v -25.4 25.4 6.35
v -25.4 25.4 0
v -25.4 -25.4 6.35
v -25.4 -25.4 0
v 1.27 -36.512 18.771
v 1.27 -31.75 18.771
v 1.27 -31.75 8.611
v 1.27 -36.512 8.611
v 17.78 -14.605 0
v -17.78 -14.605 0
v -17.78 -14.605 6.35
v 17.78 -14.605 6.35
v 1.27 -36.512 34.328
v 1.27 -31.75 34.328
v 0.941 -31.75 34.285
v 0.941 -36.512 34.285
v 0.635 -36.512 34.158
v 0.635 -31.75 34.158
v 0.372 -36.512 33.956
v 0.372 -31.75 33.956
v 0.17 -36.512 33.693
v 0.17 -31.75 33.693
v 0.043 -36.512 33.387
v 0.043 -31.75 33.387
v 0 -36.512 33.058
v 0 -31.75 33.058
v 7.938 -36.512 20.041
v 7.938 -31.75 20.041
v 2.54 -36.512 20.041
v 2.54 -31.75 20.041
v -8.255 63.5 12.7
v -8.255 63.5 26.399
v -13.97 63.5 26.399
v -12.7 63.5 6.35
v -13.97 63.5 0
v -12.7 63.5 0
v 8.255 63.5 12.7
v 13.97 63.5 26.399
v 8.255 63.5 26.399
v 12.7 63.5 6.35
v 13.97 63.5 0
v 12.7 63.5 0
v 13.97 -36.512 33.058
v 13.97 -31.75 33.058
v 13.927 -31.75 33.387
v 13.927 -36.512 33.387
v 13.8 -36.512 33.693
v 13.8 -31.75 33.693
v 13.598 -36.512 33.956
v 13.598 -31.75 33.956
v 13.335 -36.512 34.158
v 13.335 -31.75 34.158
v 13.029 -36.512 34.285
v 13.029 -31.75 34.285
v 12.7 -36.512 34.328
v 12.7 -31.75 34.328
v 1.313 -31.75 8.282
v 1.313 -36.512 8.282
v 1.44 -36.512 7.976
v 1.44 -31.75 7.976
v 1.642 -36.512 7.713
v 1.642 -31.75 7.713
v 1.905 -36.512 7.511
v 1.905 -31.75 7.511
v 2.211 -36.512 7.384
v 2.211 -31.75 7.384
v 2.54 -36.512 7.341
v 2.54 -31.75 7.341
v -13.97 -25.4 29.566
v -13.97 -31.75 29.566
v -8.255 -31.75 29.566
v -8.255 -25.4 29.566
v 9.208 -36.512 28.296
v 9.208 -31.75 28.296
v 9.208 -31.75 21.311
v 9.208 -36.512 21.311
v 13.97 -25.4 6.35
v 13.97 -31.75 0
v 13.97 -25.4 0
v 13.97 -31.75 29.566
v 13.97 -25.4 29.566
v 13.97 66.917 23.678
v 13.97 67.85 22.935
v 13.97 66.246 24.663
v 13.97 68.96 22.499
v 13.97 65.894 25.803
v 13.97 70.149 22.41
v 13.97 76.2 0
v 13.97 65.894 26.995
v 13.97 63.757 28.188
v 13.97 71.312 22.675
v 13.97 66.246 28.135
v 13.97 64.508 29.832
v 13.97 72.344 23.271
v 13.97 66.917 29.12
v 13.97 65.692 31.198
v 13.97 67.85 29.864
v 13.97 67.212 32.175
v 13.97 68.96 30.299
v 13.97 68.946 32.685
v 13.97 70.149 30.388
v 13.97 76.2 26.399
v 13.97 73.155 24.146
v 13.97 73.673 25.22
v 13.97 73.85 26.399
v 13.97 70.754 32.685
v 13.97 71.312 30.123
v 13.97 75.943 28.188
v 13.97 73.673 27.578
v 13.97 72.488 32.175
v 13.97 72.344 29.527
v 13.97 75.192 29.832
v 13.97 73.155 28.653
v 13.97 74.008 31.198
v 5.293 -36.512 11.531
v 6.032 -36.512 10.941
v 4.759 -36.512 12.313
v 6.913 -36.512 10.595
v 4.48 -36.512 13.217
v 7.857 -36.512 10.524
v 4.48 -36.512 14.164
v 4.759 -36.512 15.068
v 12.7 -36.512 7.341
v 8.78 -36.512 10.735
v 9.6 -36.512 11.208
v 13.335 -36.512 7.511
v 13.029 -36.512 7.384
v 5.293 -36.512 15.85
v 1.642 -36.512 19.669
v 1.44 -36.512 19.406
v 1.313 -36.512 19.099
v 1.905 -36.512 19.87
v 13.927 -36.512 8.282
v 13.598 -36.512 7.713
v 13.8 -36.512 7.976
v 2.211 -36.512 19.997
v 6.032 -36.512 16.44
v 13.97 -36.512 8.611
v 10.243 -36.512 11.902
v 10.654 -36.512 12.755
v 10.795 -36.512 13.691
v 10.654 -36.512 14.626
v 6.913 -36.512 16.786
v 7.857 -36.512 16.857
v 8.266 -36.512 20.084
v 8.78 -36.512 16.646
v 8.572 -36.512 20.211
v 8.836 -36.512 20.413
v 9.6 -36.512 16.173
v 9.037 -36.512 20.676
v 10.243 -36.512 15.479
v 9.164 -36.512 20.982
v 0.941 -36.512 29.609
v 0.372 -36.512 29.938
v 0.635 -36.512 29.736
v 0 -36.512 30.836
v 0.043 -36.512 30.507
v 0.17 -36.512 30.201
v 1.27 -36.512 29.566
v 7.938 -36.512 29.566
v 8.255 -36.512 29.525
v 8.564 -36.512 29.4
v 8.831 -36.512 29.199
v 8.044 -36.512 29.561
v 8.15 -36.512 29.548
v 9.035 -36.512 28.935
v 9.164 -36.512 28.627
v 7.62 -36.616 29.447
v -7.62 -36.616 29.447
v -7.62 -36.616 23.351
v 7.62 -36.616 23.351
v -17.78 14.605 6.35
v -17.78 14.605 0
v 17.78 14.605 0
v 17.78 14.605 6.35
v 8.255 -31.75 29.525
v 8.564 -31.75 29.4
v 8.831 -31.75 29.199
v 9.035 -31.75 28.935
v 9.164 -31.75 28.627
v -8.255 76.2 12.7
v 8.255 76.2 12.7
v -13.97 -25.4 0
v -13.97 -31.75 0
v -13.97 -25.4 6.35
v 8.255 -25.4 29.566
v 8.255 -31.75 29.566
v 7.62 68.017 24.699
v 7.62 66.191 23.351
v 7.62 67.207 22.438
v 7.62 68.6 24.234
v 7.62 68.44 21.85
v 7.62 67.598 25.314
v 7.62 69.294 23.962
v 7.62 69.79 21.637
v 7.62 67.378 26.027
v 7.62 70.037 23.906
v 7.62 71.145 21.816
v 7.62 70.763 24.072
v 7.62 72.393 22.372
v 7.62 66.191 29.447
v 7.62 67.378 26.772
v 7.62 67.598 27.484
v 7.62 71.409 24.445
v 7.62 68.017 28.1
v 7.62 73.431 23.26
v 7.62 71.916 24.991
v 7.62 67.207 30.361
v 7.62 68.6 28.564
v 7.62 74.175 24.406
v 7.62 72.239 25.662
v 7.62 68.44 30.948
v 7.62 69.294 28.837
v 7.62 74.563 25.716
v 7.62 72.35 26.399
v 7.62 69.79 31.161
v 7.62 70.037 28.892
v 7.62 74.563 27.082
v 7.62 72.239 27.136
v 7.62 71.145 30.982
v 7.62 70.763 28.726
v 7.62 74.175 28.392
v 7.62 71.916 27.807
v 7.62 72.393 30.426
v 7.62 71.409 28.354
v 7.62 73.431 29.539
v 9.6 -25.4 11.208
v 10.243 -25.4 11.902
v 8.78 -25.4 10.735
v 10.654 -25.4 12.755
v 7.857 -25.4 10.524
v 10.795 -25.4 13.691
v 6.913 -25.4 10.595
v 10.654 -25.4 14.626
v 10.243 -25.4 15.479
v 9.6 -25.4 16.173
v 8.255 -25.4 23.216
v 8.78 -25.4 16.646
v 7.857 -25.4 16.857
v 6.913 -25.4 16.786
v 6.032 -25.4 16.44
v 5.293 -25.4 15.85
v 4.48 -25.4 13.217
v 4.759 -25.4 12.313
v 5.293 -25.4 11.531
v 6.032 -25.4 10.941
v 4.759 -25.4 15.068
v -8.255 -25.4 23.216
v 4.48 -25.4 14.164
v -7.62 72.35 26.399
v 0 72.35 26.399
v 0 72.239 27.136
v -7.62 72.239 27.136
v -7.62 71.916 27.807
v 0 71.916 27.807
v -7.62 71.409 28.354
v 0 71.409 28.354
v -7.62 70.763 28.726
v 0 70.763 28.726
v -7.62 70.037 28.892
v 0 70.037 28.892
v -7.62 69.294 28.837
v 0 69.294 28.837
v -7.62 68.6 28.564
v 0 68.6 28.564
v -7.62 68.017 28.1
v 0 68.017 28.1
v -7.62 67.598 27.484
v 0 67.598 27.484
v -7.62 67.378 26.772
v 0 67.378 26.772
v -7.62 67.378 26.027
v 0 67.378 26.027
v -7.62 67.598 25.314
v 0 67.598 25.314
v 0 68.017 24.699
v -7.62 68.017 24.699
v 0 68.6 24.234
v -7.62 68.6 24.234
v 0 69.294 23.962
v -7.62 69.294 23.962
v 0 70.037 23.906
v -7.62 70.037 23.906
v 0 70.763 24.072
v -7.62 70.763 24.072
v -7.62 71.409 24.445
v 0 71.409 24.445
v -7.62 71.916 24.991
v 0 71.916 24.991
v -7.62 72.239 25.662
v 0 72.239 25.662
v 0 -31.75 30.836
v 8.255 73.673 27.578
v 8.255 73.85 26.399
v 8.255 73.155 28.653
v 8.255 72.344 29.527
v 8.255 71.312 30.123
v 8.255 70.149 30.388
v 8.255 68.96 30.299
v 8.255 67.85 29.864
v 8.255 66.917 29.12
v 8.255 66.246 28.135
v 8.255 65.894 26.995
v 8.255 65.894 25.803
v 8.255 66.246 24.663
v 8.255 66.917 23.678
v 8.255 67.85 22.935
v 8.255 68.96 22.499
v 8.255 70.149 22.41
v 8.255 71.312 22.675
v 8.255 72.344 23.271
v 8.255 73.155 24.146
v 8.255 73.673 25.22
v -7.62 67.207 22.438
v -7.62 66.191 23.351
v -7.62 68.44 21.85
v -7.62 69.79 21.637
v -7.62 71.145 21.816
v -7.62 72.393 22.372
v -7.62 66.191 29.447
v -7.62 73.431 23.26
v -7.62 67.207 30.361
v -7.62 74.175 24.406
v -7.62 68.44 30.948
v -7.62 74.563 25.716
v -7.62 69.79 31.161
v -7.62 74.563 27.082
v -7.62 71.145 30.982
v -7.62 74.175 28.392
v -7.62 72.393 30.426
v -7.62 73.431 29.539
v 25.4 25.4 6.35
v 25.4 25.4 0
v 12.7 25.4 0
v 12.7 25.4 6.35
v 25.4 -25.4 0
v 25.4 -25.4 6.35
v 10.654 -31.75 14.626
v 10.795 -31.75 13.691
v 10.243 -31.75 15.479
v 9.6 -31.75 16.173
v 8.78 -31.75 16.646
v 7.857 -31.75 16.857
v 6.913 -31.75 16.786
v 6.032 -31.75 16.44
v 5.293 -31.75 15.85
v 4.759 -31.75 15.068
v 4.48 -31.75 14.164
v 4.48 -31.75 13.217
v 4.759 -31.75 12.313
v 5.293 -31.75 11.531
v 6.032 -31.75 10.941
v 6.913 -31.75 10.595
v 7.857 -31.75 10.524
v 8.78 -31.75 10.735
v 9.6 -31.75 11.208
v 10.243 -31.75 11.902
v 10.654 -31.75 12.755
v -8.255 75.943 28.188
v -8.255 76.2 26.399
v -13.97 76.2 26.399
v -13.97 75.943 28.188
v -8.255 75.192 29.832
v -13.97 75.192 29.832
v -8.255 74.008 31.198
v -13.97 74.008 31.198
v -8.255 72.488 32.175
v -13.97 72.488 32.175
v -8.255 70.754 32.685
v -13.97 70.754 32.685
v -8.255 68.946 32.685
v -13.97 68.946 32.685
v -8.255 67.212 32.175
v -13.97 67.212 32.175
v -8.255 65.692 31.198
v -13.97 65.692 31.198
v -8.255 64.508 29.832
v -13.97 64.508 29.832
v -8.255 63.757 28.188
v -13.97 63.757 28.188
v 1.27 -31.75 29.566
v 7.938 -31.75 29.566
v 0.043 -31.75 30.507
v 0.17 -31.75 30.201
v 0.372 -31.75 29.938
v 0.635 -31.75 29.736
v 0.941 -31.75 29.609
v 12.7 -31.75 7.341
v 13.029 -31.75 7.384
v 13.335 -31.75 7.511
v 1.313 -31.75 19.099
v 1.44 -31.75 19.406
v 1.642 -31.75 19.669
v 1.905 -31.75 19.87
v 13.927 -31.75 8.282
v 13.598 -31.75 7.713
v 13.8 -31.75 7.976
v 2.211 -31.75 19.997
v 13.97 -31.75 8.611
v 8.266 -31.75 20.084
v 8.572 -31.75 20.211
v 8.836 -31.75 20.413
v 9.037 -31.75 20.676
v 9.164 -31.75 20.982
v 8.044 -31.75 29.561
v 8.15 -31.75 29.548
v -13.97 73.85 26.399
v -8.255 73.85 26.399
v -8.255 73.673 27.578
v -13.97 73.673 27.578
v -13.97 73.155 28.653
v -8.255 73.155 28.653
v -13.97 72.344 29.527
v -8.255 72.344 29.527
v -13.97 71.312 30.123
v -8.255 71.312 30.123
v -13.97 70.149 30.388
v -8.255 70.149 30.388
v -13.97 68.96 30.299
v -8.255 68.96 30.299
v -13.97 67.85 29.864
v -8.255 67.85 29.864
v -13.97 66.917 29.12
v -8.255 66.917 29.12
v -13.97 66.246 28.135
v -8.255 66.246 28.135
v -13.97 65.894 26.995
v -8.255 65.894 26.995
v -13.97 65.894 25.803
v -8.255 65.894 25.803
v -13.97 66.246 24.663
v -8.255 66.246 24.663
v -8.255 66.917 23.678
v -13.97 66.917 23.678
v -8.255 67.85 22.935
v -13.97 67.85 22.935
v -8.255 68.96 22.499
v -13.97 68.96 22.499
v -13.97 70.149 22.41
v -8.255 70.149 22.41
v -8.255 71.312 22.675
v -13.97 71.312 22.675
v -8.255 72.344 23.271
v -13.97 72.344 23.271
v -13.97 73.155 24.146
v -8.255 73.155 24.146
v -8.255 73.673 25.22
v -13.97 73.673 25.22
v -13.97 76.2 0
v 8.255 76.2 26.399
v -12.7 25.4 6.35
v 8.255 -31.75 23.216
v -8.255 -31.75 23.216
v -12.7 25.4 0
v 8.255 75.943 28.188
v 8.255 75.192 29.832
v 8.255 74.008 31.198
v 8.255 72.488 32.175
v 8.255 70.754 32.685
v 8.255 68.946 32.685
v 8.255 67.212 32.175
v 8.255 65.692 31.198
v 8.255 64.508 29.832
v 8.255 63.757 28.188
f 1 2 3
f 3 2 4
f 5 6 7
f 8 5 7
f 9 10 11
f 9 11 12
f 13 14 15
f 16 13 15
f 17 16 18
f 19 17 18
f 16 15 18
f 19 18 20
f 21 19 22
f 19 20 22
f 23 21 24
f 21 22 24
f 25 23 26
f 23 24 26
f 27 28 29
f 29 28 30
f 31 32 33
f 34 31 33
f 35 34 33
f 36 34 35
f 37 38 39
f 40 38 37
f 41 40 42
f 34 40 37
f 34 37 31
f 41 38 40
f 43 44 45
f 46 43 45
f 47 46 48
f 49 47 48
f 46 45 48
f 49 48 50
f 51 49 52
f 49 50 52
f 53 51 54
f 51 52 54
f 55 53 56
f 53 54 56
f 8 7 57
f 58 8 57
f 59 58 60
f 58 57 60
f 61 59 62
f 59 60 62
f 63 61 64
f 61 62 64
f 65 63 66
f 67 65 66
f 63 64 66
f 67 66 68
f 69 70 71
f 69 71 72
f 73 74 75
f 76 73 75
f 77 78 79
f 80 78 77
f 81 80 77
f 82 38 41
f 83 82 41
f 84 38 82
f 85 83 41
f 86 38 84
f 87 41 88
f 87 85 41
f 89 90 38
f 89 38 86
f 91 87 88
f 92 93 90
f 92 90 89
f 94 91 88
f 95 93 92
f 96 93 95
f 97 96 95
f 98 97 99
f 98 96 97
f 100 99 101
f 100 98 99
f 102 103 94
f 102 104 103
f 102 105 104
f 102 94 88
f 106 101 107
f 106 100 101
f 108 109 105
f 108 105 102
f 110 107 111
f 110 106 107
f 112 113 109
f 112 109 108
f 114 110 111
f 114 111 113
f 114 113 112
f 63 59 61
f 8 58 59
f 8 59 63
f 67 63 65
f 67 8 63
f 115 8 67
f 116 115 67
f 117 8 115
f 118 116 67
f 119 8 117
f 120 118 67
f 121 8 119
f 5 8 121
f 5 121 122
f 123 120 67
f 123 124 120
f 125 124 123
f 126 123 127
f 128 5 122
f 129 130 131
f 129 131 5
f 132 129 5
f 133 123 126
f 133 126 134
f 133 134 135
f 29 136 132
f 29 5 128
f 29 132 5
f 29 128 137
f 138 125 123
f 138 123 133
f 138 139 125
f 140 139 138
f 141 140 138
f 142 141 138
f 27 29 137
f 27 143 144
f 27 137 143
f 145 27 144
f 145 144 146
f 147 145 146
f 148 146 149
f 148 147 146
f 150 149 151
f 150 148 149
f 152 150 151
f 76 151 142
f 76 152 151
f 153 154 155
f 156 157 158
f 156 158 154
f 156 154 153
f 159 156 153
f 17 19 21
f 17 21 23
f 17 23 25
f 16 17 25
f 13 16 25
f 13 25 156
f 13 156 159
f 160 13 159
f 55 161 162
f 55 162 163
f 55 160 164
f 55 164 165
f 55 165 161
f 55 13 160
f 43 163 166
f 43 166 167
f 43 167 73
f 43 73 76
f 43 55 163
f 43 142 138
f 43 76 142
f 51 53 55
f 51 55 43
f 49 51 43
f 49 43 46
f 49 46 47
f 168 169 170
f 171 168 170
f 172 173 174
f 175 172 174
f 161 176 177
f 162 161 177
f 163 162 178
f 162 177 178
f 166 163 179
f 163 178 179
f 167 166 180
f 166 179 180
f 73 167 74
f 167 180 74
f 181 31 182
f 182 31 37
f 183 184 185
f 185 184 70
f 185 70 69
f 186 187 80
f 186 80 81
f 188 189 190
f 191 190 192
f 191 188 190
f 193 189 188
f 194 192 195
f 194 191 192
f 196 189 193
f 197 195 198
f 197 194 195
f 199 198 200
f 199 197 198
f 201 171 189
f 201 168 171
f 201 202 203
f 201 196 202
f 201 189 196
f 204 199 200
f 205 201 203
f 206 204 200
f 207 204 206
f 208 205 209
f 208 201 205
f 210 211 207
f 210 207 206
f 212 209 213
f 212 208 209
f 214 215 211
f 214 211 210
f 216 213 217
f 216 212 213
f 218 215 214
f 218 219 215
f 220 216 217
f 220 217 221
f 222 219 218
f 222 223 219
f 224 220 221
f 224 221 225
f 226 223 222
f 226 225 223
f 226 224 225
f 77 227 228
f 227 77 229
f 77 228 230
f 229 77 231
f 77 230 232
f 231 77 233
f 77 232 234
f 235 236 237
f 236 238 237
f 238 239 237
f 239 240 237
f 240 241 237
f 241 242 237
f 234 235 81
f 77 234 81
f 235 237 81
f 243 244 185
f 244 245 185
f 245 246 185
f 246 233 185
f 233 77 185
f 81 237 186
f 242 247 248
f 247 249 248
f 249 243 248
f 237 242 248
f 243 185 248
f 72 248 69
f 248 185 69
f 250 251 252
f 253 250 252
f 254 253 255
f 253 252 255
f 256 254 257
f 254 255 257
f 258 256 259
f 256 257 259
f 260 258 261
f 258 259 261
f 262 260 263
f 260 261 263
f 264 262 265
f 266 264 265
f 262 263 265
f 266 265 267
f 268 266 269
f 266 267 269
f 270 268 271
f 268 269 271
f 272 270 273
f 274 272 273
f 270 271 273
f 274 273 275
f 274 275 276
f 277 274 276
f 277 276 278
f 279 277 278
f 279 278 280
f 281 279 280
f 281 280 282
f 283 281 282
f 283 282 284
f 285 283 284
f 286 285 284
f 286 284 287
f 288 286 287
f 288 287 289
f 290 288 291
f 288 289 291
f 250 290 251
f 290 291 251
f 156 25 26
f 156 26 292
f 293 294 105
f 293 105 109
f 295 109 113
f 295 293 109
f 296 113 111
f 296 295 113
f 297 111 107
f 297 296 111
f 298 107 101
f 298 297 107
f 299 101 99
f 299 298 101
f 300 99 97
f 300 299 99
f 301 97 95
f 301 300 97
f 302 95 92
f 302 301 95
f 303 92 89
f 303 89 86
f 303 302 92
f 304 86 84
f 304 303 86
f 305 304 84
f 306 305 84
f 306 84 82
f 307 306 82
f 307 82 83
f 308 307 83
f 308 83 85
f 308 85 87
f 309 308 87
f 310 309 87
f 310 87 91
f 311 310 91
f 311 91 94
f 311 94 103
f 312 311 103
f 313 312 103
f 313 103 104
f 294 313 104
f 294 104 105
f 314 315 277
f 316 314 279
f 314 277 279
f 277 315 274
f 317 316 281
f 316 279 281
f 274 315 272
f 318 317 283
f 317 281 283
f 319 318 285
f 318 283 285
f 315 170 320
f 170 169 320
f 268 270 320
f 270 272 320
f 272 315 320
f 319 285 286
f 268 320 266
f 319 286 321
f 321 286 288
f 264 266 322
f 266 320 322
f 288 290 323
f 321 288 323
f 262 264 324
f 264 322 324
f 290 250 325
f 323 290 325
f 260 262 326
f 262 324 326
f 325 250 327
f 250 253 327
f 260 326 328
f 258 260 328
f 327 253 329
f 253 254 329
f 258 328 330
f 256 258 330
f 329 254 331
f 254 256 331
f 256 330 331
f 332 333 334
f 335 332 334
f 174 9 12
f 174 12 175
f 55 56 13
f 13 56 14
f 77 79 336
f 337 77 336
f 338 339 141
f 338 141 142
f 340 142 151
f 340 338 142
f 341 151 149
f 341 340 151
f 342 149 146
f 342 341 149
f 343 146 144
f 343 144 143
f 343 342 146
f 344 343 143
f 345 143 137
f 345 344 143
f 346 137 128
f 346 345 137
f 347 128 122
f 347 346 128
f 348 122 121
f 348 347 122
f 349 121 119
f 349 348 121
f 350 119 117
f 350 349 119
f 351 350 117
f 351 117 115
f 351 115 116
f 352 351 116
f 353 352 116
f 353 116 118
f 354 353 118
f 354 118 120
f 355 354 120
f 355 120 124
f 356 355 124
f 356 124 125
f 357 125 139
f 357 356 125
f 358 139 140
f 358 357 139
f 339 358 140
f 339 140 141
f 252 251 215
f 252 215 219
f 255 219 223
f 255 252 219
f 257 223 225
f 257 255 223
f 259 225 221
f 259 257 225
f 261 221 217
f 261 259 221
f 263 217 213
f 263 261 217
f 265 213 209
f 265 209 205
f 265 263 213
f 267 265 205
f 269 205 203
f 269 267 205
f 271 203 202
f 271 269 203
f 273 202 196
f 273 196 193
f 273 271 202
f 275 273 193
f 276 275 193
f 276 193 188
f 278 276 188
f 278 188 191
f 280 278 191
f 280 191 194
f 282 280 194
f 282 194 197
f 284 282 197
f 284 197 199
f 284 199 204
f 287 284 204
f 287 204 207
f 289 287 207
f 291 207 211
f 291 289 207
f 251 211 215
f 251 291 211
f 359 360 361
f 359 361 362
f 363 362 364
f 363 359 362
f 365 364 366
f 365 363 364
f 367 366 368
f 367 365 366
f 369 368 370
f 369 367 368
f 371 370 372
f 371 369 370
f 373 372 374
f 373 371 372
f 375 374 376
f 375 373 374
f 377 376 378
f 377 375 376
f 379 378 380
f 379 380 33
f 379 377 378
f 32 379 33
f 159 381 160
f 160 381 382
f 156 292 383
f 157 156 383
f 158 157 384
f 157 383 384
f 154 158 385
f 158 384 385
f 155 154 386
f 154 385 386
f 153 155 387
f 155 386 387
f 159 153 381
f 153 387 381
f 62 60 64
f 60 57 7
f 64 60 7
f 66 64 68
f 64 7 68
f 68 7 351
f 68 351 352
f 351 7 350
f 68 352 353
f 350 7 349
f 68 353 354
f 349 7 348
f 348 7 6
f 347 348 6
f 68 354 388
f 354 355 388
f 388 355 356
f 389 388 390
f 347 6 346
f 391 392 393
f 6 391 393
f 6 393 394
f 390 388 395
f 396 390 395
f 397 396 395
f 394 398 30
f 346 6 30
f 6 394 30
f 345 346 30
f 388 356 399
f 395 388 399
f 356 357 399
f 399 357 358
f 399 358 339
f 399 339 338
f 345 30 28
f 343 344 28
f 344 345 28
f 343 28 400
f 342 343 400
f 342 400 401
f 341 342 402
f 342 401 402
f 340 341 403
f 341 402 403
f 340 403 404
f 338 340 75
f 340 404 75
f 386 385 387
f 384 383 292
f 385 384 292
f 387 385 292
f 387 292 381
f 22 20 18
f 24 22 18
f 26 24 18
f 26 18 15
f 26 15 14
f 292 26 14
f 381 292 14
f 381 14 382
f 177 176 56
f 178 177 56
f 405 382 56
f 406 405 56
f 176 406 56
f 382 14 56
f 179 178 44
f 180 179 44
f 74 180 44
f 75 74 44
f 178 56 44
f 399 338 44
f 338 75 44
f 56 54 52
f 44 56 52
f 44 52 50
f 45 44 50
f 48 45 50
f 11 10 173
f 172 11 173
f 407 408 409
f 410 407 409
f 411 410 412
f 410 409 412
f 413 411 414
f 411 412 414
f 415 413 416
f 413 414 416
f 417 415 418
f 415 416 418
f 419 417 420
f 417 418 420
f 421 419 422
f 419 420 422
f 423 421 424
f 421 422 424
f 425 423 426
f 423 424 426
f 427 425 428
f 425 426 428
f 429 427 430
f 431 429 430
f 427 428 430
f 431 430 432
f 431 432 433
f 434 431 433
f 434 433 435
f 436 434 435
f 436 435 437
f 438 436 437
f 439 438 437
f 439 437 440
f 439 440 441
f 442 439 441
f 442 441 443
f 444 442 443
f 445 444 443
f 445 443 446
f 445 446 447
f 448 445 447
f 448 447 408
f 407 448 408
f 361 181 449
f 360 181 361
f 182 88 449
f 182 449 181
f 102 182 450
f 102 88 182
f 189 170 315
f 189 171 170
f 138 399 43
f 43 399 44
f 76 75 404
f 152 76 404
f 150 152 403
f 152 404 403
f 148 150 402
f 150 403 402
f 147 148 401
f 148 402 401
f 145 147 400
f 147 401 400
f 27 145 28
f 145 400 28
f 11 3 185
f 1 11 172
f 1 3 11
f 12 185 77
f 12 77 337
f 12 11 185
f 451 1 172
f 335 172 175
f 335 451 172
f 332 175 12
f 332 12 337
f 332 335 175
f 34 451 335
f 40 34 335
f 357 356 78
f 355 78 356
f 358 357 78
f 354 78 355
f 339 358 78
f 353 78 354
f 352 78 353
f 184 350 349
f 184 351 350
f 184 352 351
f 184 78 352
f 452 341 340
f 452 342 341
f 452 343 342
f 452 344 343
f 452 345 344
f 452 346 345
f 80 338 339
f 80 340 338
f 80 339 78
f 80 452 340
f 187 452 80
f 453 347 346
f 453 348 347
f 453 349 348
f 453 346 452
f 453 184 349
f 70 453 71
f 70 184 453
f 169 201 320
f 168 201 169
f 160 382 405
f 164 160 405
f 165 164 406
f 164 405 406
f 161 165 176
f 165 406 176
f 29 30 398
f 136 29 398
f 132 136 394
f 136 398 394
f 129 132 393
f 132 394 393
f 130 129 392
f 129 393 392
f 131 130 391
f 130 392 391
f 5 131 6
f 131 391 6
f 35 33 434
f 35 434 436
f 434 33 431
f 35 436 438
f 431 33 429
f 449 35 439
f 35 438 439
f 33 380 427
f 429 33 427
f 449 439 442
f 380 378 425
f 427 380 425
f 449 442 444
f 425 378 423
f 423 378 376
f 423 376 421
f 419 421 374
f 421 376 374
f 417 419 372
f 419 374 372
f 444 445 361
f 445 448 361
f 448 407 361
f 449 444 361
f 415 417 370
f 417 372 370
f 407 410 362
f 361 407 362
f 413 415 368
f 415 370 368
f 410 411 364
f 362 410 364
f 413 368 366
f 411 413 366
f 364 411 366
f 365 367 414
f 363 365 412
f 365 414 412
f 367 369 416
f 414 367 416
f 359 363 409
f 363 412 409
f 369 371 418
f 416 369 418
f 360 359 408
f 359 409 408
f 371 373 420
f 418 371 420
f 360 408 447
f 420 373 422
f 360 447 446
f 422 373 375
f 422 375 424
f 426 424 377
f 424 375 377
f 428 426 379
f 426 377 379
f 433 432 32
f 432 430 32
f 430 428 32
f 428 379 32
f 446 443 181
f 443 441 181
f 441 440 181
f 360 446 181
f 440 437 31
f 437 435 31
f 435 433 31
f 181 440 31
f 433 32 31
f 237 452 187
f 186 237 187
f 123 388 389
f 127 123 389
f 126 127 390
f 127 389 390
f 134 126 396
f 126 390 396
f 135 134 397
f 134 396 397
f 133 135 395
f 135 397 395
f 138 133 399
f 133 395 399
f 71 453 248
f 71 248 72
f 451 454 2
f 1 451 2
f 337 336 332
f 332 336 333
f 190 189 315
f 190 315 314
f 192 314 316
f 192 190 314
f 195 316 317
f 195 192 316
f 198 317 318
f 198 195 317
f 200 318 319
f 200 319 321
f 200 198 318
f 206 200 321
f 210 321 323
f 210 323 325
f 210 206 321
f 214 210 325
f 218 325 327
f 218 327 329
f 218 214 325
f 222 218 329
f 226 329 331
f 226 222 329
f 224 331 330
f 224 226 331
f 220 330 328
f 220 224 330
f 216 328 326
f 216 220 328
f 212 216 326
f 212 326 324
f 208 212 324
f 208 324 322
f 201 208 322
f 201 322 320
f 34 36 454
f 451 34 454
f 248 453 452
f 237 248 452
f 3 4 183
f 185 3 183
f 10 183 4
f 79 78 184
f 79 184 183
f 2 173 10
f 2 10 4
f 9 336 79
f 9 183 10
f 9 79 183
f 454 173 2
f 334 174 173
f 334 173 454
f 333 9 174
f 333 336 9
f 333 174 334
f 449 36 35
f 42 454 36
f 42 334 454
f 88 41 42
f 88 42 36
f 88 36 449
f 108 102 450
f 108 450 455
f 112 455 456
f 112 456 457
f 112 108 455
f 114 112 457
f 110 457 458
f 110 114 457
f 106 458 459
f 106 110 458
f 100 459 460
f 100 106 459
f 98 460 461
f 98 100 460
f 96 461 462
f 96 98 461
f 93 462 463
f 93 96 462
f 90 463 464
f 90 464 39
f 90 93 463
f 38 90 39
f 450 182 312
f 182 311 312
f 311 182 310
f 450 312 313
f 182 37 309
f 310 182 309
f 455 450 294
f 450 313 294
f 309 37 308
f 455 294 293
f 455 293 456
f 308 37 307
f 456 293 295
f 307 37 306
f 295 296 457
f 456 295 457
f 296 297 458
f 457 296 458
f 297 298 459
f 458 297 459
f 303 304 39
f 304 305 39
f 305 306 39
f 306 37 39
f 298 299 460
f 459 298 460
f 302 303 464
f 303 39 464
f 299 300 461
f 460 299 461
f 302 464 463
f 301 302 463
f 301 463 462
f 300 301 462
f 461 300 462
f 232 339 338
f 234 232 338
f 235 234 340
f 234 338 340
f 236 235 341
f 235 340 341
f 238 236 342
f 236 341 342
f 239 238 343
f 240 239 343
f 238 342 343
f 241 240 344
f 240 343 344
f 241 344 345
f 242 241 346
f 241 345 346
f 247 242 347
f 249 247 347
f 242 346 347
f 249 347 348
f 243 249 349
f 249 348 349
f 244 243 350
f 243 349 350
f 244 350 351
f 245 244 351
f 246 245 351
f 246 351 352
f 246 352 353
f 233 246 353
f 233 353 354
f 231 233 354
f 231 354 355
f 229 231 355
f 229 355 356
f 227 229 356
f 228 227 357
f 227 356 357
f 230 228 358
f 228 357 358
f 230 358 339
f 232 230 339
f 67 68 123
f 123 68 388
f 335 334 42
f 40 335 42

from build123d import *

# Parameters (mm, degrees)
F0_W          = 35.56
F0_H          = 29.21
F1_DEPTH      = 6.35
F2_R          = 4.0005
F2_W          = 6.35
F2_H          = 29.5656
F3_DEPTH      = 13.97
F3_DEPTH_BACK = 13.97
F4_W          = 16.51
F4_H          = 11.7008156112
F4_H_2        = 13.6991843888
F5_DEPTH      = 12.701
F6_R          = 2.5
F7_DEPTH      = 7.62
F7_DEPTH_BACK = 7.62
F8_W          = 16.51
F8_H          = 6.35
F9_DEPTH      = 106.3635
F10_R         = 3.175
F11_DEPTH     = 4.7625
F12_DEPTH     = 6.35


with BuildPart() as f1:
    # F0 (on Top) → F1 (new body)
    with BuildSketch(Plane.XY):
        Polygon((-12.7, 25.4), (-25.4, 25.4), (-25.4, -25.4), (25.4, -25.4), (25.4, 25.4), (12.7, 25.4), (12.7, 63.5), (-12.7, 63.5), align=None)
        Rectangle(F0_W, F0_H, mode=Mode.SUBTRACT)
    extrude(amount=F1_DEPTH)

    # F2 (on Right) → F3 (join, two sides)
    with BuildSketch(Plane.YZ) as f3_sk:
        with BuildLine():
            Line((76.2, 0), (76.2, 26.3991843888))
            ThreePointArc((76.2, 26.3991843888), (69.85, 32.7491843888), (63.5, 26.3991843888))
            Line((63.5, 26.3991843888), (63.5, 0))
            Line((63.5, 0), (76.2, 0))
        make_face()
        with Locations((69.85, 26.3991843888)):
            Circle(F2_R, mode=Mode.SUBTRACT)
        with Locations((-28.575, 14.7828)):
            Rectangle(F2_W, F2_H)
    extrude(amount=F3_DEPTH)
    extrude(f3_sk.sketch, amount=-F3_DEPTH_BACK)

    # F4 (on face) → F5 (cut, through all)
    with BuildSketch(Plane.XZ.offset(-63.5)):
        with Locations((0, 32.2495921944)):
            Rectangle(F4_W, F4_H)
        with Locations((0, 19.5495921944)):
            Rectangle(F4_W, F4_H_2)
    extrude(amount=-F5_DEPTH, mode=Mode.SUBTRACT)

    # F8 (on face) → F9 (cut, through all)
    with BuildSketch(Plane.XZ.offset(31.75)):
        with Locations((0, 26.3906)):
            Rectangle(F8_W, F8_H)
    extrude(amount=-F9_DEPTH, mode=Mode.SUBTRACT)

    # F10 (on face) → F12 (cut, through all)
    with BuildSketch(Plane.XZ.offset(31.75)):
        with Locations((7.62, 13.6906)):
            Circle(F10_R)
    extrude(amount=-F12_DEPTH, mode=Mode.SUBTRACT)


with BuildPart() as f7:
    # F6 (on Right) → F7 (new body, two sides)
    with BuildSketch(Plane.YZ) as f7_sk:
        with BuildLine():
            Line((-36.6158854962, 23.3511843888), (66.1906144983, 23.3511843888))
            ThreePointArc((66.1906144983, 23.3511843888), (74.6125, 26.3991843888), (66.1906144983, 29.4471843888))
            Line((66.1906144983, 29.4471843888), (-36.6158855017, 29.4471843888))
            Line((-36.6158855017, 29.4471843888), (-36.6158854962, 23.3511843888))
        make_face()
        with Locations((69.85, 26.3991843888)):
            Circle(F6_R, mode=Mode.SUBTRACT)
    extrude(amount=F7_DEPTH)
    extrude(f7_sk.sketch, amount=-F7_DEPTH_BACK)


with BuildPart() as f11:
    # F10 (on face) → F11 (new body)
    with BuildSketch(Plane.XZ.offset(31.75)):
        with BuildLine():
            Line((8.255, 29.5656), (8.255, 29.5252722124))
            ThreePointArc((8.255, 29.5252722124), (8.9415231571, 29.0733129933), (9.2075, 28.2956))
            Line((9.2075, 28.2956), (9.2075, 21.3106))
            ThreePointArc((9.2075, 21.3106), (8.8355256121, 20.4125743879), (7.9375, 20.0406))
            Line((7.9375, 20.0406), (2.54, 20.0406))
            ThreePointArc((2.54, 20.0406), (1.6419743879, 19.6686256121), (1.27, 18.7706))
            Line((1.27, 18.7706), (1.27, 8.6106))
            ThreePointArc((1.27, 8.6106), (1.6419743879, 7.7125743879), (2.54, 7.3406))
            Line((2.54, 7.3406), (12.7, 7.3406))
            ThreePointArc((12.7, 7.3406), (13.5980256121, 7.7125743879), (13.97, 8.6106))
            Line((13.97, 8.6106), (13.97, 29.5656))
            Line((13.97, 29.5656), (8.255, 29.5656))
        make_face()
        with Locations((7.62, 13.6906)):
            Circle(F10_R, mode=Mode.SUBTRACT)
        with BuildLine():
            Line((0, 33.0581), (0, 30.8356))
            ThreePointArc((0, 30.8356), (0.3719743879, 29.9375743879), (1.27, 29.5656))
            Line((1.27, 29.5656), (7.9375, 29.5656))
            ThreePointArc((7.9375, 29.5656), (8.0975254515, 29.5554777143), (8.255, 29.5252722124))
            Line((8.255, 29.5252722124), (8.255, 29.5656))
            Line((8.255, 29.5656), (13.97, 29.5656))
            Line((13.97, 29.5656), (13.97, 33.0581))
            ThreePointArc((13.97, 33.0581), (13.5980256121, 33.9561256121), (12.7, 34.3281))
            Line((12.7, 34.3281), (1.27, 34.3281))
            ThreePointArc((1.27, 34.3281), (0.3719743879, 33.9561256121), (0, 33.0581))
        make_face()
    extrude(amount=F11_DEPTH)


solid = Compound([f1.part, f7.part, f11.part])
